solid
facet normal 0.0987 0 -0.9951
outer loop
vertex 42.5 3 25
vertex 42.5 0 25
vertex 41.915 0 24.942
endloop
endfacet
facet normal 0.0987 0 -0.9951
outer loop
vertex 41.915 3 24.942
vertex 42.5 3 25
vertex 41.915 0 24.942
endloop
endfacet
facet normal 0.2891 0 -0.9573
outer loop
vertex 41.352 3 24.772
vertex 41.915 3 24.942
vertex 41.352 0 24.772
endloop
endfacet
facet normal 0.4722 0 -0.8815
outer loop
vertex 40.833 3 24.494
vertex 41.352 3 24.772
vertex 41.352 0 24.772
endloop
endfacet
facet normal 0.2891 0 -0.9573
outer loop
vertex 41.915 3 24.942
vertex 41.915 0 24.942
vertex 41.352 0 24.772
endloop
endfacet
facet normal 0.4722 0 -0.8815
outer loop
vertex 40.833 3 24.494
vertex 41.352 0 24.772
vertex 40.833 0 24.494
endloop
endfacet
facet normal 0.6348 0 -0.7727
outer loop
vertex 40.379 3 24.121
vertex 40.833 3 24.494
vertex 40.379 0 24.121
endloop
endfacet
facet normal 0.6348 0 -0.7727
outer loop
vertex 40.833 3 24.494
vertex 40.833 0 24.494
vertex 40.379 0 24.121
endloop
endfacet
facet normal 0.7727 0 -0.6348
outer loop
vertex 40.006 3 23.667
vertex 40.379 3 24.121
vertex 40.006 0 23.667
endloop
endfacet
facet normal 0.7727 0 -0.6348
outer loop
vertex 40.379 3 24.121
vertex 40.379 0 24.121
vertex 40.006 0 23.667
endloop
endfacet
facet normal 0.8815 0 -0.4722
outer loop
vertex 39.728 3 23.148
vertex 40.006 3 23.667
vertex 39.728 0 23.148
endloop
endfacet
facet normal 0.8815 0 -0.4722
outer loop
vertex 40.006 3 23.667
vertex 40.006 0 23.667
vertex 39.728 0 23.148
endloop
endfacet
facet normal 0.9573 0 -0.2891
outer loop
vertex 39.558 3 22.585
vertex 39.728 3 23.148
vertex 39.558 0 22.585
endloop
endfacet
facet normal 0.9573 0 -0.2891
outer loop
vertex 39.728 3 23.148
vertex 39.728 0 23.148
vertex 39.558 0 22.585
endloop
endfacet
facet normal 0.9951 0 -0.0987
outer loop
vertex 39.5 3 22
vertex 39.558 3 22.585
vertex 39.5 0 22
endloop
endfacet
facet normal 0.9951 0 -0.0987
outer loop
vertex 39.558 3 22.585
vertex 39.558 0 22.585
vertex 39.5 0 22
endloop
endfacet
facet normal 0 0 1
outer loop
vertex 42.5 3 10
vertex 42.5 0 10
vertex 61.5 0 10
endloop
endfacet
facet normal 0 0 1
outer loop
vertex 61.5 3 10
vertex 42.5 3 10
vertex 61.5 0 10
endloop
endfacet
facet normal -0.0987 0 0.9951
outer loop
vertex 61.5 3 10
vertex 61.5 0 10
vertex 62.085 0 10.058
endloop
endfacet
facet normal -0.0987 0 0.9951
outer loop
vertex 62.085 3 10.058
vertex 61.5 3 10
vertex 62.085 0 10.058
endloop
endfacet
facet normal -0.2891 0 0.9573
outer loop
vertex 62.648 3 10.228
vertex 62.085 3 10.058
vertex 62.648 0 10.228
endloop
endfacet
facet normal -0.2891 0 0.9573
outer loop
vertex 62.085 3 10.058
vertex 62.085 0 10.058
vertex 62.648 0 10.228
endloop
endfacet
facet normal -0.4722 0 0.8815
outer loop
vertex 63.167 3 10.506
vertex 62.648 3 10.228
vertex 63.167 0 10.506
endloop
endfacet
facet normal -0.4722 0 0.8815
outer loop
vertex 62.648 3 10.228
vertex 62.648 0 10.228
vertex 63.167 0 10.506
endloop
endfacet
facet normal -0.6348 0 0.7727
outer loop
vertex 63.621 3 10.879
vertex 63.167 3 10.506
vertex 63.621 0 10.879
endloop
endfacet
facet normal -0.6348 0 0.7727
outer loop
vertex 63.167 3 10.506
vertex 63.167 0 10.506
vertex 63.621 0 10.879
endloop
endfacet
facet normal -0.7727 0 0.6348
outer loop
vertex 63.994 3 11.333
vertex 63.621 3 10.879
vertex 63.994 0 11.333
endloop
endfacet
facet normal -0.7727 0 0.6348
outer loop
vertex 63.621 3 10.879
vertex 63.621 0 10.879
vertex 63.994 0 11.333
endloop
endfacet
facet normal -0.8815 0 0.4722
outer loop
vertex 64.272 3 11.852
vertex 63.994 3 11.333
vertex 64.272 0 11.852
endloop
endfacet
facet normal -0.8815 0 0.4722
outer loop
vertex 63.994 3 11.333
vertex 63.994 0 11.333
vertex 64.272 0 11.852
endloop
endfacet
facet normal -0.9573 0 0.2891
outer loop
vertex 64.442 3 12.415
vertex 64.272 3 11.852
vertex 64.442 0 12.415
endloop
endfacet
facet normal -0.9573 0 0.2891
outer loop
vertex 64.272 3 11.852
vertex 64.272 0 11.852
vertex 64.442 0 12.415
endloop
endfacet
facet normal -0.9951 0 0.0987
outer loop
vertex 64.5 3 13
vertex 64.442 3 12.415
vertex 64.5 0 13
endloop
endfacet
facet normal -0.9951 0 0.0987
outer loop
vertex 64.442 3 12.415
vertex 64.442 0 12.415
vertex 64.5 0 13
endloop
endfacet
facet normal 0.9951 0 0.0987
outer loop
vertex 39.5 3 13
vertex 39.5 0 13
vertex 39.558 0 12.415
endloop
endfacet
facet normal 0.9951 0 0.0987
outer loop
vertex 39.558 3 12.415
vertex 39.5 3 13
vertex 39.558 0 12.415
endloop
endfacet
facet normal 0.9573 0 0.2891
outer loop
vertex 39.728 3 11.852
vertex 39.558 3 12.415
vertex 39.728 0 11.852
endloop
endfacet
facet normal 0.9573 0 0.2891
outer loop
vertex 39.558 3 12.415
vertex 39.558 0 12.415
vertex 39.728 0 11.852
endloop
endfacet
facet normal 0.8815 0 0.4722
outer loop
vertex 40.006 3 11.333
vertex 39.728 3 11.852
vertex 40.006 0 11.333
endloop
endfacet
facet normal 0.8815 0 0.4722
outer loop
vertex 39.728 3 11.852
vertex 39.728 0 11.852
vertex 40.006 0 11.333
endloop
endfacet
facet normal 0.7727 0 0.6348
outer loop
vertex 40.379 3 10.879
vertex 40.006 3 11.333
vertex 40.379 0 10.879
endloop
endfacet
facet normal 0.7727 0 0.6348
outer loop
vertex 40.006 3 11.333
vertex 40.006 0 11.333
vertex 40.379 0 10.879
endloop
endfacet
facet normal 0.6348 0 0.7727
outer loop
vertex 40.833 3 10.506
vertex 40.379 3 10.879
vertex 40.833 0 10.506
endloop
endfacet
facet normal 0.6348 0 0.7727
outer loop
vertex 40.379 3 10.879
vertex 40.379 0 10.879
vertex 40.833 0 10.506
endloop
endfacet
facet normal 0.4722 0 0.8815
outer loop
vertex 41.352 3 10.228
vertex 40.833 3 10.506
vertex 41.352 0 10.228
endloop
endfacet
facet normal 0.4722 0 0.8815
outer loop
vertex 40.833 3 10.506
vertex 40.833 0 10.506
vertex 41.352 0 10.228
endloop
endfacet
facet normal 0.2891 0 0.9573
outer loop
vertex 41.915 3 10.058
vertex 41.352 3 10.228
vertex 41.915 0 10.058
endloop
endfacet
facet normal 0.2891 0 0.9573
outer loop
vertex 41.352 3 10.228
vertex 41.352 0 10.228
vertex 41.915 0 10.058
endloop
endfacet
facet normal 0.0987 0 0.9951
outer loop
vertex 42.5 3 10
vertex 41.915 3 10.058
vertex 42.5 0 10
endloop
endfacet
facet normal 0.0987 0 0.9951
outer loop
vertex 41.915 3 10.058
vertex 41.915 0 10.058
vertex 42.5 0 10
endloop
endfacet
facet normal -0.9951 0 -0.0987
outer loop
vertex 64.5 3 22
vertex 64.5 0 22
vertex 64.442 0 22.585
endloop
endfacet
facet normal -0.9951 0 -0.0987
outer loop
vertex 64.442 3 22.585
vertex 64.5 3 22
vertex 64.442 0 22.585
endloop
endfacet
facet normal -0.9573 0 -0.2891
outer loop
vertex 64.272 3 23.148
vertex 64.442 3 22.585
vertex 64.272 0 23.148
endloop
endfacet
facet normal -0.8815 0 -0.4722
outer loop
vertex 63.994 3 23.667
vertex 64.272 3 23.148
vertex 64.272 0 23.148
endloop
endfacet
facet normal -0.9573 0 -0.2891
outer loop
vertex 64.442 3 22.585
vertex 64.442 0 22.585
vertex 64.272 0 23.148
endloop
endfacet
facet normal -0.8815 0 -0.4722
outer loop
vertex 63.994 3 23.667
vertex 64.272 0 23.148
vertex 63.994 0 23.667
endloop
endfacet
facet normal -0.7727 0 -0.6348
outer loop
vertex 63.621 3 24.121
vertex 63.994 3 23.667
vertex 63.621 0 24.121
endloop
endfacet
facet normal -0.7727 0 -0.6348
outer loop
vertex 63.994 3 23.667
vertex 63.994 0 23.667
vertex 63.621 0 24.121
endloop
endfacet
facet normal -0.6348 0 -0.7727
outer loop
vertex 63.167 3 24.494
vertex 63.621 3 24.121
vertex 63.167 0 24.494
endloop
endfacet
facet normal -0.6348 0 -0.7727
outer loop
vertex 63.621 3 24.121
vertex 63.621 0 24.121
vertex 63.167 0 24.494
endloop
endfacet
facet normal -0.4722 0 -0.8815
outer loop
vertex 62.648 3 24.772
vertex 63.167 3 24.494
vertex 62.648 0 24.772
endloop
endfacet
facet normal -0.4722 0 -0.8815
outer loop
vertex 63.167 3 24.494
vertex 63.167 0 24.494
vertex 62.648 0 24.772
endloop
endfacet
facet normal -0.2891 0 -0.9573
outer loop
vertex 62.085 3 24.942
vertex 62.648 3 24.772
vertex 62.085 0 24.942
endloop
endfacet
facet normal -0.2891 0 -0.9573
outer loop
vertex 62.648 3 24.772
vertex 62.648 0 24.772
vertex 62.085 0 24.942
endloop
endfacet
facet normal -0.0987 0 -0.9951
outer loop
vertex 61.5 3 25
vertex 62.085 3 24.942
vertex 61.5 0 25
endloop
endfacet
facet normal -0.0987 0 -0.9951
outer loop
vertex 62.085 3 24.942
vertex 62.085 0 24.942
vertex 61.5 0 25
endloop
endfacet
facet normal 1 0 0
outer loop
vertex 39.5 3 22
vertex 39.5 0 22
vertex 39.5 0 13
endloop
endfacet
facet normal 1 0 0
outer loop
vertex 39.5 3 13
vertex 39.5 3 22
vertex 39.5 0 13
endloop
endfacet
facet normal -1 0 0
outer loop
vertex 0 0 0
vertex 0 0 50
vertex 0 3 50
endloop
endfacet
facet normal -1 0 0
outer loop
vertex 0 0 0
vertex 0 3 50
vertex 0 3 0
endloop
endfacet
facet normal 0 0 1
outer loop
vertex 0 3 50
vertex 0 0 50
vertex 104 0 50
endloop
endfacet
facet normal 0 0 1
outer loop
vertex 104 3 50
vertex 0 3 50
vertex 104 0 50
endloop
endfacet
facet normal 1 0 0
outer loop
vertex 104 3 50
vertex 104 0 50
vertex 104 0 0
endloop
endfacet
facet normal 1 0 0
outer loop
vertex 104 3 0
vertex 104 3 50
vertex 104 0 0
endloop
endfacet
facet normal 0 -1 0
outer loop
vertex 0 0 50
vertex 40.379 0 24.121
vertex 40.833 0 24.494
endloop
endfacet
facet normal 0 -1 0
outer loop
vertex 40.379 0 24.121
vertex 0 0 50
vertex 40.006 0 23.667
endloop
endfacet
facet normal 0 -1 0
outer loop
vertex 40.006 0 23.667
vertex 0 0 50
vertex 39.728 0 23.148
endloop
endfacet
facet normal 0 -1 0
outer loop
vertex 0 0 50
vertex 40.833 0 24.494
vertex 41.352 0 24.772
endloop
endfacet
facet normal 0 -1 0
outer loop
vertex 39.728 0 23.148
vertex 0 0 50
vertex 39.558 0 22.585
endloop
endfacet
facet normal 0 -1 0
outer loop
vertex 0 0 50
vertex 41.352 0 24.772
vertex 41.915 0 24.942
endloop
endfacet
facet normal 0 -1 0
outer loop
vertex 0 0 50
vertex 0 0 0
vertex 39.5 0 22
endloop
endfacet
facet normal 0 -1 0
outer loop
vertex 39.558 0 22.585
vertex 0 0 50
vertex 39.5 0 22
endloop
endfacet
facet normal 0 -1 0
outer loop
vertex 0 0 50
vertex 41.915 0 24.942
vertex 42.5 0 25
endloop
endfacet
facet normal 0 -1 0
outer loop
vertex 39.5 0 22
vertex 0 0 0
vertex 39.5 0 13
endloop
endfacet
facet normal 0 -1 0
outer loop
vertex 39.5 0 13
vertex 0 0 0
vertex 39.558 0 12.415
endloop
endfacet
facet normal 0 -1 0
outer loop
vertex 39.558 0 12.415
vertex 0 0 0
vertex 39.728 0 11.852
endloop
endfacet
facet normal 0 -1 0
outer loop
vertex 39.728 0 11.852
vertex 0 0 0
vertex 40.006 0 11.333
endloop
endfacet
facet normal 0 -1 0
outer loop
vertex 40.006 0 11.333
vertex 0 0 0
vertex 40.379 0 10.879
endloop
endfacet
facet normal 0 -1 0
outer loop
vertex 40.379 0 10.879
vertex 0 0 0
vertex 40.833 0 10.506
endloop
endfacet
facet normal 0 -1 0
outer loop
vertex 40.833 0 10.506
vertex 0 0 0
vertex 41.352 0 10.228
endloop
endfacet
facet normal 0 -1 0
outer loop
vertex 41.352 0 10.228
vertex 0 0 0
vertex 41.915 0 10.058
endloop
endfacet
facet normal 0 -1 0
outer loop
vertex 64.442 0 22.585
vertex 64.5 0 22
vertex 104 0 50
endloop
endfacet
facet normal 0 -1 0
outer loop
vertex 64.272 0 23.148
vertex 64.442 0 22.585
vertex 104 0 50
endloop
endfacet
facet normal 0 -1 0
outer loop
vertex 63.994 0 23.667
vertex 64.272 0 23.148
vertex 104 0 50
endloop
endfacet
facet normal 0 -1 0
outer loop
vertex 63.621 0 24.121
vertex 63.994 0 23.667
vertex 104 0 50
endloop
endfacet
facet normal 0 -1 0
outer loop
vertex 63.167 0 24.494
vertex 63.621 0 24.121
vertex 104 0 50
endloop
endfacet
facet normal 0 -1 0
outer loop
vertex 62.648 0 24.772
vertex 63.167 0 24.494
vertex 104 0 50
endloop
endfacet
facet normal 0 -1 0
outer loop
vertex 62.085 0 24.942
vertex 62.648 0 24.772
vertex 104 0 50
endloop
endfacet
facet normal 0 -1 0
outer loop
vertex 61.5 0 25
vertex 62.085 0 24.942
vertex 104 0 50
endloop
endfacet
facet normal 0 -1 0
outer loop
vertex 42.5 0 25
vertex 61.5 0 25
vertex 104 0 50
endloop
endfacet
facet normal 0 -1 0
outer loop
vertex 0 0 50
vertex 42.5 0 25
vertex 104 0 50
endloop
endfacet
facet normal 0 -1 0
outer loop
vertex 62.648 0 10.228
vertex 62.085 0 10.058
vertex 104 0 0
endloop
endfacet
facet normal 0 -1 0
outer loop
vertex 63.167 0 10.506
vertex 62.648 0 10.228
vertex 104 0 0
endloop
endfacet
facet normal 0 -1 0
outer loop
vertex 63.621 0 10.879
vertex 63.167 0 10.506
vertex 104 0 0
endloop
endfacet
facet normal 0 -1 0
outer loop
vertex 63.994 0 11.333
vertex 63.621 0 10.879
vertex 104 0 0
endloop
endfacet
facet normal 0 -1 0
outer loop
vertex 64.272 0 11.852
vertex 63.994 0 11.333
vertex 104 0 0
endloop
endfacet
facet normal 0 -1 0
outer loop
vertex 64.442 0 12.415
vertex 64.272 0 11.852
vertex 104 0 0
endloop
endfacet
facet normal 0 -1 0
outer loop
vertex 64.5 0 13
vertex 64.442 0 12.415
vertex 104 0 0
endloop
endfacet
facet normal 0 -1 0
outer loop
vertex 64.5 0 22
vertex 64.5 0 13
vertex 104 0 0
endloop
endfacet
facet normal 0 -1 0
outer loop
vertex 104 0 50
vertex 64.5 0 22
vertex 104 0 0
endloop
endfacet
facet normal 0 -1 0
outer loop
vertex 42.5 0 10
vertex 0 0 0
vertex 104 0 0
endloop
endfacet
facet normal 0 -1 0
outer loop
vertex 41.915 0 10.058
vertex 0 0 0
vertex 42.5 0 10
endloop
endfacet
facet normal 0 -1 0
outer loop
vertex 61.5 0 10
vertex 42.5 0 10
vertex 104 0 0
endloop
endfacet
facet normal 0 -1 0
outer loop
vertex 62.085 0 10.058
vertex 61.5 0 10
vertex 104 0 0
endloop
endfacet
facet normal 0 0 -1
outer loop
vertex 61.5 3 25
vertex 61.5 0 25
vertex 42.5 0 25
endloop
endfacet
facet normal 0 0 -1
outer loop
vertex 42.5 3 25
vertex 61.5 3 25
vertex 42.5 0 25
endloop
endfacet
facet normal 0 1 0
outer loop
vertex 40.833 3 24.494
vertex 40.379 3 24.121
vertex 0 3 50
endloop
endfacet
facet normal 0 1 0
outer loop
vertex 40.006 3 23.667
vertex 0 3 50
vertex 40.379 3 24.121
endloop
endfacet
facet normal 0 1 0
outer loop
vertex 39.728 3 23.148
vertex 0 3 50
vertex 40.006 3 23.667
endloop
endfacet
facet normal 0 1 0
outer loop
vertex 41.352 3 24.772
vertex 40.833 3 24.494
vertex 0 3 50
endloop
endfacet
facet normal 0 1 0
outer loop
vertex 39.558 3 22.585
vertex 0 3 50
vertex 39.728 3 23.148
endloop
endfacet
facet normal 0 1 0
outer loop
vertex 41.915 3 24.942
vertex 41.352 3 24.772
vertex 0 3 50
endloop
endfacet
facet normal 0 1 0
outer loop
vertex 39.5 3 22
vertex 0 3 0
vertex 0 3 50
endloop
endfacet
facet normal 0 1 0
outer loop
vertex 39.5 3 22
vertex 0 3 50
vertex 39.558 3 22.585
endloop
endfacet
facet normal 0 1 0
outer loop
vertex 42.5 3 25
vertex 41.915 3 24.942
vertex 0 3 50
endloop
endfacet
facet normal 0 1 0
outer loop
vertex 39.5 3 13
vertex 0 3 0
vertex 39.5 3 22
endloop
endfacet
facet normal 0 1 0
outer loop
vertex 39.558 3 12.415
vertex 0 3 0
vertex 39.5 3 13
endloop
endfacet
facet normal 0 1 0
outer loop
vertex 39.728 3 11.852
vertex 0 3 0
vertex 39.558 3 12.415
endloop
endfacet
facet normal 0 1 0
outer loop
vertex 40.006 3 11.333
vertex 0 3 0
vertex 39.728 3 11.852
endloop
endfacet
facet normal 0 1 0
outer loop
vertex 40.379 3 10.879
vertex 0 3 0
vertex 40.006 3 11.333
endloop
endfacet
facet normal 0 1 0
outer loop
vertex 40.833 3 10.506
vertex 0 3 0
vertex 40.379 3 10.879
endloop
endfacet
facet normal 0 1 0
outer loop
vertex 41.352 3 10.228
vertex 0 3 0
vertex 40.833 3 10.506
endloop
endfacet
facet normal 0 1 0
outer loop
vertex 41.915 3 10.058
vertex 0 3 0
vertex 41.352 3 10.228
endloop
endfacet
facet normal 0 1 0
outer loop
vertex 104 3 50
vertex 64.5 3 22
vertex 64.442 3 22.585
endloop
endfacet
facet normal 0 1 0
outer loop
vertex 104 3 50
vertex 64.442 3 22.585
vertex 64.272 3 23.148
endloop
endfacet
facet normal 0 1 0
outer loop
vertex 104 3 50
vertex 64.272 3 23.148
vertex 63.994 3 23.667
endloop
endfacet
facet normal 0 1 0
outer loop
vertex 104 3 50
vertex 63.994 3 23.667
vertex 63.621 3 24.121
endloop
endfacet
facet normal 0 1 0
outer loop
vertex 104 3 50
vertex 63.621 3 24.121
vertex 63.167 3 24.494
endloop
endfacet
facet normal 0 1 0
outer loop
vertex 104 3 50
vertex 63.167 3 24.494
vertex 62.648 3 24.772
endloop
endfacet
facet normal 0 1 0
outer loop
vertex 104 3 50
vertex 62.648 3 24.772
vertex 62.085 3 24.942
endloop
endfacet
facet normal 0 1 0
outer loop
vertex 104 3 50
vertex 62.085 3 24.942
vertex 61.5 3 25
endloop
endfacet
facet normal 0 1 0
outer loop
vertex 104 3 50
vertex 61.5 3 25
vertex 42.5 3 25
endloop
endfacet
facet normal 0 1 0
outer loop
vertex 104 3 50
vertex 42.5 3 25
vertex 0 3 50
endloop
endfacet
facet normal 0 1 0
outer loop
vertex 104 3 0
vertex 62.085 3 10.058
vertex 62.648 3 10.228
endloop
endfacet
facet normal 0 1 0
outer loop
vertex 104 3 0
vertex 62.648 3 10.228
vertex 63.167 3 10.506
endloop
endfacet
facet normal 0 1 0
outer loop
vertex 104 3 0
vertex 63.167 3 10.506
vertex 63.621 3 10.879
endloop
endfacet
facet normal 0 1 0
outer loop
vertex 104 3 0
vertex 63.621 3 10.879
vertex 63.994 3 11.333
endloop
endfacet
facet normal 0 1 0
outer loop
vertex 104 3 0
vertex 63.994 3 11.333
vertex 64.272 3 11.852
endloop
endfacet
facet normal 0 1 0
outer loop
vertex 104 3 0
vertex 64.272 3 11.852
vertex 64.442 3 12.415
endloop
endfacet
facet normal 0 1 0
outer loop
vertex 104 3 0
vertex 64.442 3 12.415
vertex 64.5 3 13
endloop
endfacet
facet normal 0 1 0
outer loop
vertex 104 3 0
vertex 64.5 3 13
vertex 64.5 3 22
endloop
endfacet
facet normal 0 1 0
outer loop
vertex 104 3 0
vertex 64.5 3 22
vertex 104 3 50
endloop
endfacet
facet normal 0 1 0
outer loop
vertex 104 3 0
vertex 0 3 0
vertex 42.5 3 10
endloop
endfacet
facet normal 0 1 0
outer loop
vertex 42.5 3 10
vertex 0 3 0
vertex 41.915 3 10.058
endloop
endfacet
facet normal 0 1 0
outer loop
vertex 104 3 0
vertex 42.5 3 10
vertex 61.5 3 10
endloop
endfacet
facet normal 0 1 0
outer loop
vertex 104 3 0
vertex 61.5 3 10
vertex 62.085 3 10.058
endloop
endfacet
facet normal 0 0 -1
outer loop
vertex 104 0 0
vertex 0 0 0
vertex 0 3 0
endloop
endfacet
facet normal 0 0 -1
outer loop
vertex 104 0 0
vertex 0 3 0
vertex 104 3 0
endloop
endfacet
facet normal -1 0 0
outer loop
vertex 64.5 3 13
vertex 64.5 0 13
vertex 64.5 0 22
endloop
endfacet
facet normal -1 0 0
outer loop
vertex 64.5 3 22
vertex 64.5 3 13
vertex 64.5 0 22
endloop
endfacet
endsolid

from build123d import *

# Parameters (mm, degrees)
IZIM1_W                     = 104
IZIM1_H                     = 50
Y_KSEKLIK_EKSTR_ZYON1_DEPTH = 3


with BuildPart() as part:
    # Çizim1 → Yükseklik-Ekstrüzyon1 (new body)
    with BuildSketch(Plane(origin=(0, 0, 0), x_dir=(1, 0, 0), z_dir=(0, 1, 0))):
        with Locations((52, -25)):
            Rectangle(IZIM1_W, IZIM1_H)
        with BuildLine():
            Line((42.5, -10), (61.5, -10))
            ThreePointArc((61.5, -10), (63.621320344, -10.878679656), (64.5, -13))
            Line((64.5, -13), (64.5, -22))
            ThreePointArc((64.5, -22), (63.621320344, -24.121320344), (61.5, -25))
            Line((61.5, -25), (42.5, -25))
            ThreePointArc((42.5, -25), (40.378679656, -24.121320344), (39.5, -22))
            Line((39.5, -22), (39.5, -13))
            ThreePointArc((39.5, -13), (40.378679656, -10.878679656), (42.5, -10))
        make_face(mode=Mode.SUBTRACT)
    extrude(amount=Y_KSEKLIK_EKSTR_ZYON1_DEPTH)


solid = part.part
